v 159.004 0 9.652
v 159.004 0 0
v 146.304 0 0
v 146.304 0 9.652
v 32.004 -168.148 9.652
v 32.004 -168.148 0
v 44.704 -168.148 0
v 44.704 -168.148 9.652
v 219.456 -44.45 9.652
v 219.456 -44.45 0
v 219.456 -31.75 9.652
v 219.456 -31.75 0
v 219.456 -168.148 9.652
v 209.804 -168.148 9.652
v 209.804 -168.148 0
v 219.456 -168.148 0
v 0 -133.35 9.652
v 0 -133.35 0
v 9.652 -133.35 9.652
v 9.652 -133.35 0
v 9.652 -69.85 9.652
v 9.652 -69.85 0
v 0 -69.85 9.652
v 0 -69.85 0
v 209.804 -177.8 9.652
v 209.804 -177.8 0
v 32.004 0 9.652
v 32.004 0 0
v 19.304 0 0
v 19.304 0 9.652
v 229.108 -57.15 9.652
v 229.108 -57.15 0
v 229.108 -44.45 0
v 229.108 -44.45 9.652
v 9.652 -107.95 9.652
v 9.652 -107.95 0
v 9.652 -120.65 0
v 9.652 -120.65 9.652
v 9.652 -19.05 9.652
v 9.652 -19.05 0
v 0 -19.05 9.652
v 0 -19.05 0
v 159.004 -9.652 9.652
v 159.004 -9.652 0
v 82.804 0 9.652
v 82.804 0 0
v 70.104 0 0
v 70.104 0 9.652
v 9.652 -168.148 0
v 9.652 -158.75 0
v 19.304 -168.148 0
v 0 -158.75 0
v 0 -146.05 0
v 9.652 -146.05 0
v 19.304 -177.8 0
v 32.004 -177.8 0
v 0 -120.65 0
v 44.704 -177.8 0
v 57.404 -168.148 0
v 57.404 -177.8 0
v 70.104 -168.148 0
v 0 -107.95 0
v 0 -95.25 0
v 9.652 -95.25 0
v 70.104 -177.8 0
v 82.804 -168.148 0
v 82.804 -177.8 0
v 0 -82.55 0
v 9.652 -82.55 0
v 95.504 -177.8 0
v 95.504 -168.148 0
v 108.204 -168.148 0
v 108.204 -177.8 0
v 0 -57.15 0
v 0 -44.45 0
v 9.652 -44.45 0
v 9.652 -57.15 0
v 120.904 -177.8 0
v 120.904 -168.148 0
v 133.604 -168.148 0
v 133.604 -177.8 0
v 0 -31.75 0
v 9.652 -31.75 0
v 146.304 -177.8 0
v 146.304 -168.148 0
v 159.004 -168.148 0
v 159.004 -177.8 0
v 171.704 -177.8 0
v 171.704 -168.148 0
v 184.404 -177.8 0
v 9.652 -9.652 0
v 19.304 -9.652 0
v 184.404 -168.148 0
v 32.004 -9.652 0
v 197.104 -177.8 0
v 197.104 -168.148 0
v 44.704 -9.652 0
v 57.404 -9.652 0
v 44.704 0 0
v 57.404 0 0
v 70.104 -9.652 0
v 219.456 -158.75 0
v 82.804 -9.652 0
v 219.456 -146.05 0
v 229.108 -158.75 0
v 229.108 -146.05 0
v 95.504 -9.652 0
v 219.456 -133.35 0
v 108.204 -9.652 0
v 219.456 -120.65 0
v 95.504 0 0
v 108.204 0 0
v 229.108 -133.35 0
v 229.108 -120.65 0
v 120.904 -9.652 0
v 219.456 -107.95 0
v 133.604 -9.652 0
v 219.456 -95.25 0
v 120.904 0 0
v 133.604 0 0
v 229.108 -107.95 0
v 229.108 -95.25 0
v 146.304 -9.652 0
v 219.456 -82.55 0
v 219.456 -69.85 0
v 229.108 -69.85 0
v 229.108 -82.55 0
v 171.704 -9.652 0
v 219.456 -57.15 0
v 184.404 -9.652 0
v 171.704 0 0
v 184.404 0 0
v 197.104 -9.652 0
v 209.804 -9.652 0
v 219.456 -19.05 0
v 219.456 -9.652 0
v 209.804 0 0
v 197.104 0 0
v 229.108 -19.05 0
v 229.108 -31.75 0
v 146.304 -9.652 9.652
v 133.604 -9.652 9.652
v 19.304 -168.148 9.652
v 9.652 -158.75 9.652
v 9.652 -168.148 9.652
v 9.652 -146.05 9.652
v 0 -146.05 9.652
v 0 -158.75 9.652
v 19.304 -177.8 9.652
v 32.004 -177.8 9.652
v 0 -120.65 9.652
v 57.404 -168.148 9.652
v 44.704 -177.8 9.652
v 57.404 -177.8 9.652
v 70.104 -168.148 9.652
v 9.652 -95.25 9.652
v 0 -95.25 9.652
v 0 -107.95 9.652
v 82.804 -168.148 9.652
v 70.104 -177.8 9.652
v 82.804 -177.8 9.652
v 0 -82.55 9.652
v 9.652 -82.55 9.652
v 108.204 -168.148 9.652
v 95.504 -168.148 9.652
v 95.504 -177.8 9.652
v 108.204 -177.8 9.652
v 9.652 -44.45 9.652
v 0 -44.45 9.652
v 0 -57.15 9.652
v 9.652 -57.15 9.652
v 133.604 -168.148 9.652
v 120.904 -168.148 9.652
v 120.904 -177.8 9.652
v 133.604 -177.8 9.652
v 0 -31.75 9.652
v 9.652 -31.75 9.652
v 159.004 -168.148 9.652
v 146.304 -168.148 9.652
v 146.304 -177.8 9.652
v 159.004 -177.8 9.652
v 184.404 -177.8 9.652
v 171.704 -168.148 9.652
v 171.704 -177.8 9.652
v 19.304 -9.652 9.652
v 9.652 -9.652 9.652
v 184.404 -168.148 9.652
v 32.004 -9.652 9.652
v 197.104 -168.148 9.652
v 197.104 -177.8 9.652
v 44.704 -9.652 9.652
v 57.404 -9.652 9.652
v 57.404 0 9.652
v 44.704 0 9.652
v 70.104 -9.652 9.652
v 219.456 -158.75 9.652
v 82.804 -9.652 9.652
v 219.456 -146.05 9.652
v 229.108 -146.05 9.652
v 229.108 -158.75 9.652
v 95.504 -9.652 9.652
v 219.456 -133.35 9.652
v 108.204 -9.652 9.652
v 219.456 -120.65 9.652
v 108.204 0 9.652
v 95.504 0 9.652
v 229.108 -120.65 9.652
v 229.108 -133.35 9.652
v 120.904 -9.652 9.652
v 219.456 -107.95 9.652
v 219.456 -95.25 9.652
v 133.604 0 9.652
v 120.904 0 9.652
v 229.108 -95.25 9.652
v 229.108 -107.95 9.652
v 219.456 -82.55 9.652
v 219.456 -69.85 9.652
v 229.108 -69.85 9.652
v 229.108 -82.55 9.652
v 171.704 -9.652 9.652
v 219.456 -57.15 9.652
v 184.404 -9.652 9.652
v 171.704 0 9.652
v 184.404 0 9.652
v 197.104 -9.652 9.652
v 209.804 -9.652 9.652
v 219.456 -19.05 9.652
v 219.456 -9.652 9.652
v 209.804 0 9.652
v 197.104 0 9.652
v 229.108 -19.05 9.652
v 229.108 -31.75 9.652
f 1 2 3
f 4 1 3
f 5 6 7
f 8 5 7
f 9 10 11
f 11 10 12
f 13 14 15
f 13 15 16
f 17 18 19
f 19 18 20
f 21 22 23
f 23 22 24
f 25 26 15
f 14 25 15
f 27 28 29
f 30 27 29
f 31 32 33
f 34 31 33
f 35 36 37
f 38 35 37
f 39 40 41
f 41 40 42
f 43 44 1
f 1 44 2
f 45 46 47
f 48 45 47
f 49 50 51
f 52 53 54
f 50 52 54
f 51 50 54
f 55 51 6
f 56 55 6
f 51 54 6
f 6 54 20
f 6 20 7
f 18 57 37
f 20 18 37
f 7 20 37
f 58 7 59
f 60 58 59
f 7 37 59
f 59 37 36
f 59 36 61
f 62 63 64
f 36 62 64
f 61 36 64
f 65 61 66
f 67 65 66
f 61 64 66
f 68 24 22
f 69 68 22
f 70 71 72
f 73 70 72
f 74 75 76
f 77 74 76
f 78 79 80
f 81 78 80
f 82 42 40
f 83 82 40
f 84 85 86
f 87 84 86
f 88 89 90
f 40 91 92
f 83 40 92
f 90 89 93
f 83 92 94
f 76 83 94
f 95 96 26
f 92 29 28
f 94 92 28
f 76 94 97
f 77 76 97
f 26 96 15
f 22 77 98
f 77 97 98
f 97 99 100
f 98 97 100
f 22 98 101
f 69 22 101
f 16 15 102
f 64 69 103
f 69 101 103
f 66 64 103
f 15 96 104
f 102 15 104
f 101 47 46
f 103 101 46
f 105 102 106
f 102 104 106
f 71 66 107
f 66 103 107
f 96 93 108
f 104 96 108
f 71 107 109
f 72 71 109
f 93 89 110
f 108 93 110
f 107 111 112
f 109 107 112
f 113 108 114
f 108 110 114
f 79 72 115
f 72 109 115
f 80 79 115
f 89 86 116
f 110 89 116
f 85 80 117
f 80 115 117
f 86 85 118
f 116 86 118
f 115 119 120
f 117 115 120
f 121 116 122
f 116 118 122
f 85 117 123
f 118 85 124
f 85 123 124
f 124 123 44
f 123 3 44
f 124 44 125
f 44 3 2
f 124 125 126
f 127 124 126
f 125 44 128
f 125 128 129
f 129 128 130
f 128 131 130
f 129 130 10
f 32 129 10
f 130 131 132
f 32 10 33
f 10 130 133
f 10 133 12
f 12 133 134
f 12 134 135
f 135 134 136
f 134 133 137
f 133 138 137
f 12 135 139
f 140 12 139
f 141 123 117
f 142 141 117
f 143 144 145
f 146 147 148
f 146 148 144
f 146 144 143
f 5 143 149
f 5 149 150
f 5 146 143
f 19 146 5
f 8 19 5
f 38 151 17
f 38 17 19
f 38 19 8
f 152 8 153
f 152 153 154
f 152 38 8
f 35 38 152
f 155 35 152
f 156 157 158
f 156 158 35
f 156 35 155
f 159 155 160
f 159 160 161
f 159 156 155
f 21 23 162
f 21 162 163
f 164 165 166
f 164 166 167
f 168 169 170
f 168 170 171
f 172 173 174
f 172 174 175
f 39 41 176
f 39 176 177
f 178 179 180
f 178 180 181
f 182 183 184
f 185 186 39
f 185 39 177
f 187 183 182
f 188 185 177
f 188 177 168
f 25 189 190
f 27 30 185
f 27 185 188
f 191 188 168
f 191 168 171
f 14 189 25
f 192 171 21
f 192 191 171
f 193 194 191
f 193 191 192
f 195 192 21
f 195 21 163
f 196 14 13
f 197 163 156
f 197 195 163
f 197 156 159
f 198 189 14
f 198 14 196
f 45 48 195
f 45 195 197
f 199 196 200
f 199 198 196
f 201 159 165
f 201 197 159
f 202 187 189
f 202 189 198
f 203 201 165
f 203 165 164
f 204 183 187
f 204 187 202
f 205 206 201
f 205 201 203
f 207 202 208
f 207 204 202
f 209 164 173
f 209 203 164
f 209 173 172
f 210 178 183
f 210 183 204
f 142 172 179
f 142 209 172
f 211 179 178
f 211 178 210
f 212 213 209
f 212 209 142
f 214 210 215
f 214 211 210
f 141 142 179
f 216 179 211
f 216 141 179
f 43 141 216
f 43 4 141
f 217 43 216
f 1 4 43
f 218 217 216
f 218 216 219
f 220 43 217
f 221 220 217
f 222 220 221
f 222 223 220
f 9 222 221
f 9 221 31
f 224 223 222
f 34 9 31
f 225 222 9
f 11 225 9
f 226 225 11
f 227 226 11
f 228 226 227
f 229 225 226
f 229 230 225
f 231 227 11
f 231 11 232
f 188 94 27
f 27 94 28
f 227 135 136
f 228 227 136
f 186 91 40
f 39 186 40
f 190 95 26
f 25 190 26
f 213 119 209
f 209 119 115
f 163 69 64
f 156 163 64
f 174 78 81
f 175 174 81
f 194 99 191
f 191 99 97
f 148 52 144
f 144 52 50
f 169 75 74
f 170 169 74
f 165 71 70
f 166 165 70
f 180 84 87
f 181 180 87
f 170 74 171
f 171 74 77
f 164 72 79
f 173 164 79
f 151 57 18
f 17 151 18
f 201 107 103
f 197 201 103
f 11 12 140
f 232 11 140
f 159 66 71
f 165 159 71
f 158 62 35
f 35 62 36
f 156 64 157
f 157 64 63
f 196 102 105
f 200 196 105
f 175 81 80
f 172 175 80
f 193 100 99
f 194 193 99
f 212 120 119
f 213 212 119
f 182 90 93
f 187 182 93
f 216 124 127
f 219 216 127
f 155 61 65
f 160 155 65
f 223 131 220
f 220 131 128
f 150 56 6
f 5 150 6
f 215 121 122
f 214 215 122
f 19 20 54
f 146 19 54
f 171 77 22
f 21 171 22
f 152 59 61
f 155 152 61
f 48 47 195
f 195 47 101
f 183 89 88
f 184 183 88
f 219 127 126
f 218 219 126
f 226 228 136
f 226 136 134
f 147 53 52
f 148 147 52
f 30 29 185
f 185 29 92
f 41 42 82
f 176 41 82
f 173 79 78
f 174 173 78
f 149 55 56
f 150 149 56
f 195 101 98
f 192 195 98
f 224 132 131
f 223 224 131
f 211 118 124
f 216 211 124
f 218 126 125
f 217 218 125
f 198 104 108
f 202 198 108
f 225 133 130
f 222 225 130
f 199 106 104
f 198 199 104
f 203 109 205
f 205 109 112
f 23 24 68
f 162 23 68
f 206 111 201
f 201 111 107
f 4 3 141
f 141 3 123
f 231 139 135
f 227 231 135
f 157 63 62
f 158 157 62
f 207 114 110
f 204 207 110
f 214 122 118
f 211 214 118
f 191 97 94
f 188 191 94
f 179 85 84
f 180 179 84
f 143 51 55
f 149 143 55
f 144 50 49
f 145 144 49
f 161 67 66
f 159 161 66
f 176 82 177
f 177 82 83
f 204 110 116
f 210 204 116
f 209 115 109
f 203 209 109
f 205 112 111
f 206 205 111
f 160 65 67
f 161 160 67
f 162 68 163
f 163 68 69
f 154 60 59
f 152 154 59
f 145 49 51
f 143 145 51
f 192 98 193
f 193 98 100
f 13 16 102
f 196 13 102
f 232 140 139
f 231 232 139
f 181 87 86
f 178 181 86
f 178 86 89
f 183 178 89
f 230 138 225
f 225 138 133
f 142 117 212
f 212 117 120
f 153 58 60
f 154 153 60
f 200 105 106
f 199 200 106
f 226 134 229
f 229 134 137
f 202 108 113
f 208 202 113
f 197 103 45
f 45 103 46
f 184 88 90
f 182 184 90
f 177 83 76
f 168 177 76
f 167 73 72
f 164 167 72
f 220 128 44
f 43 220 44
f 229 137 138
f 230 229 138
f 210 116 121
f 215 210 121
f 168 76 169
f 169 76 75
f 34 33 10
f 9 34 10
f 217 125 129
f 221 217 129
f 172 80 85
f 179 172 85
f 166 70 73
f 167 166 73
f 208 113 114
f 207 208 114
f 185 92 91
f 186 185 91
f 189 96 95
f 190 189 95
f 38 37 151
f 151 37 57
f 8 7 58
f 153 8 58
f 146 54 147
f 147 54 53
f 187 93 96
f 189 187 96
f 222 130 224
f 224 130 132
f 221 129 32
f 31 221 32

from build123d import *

# Parameters (mm, degrees)
F1_DEPTH = 9.652


with BuildPart() as f1:
    # F0 (on Top) → F1 (new body)
    with BuildSketch(Plane.XY):
        Polygon((32.004, 0), (19.304, 0), (19.304, -9.652), (9.652, -9.652), (9.652, -19.05), (0, -19.05), (0, -31.75), (9.652, -31.75), (9.652, -44.45), (0, -44.45), (0, -57.15), (9.652, -57.15), (9.652, -69.85), (0, -69.85), (0, -82.55), (9.652, -82.55), (9.652, -95.25), (0, -95.25), (0, -107.95), (9.652, -107.95), (9.652, -120.65), (0, -120.65), (0, -133.35), (9.652, -133.35), (9.652, -146.05), (0, -146.05), (0, -158.75), (9.652, -158.75), (9.652, -168.148), (19.304, -168.148), (19.304, -177.8), (32.004, -177.8), (32.004, -168.148), (44.704, -168.148), (44.704, -177.8), (57.404, -177.8), (57.404, -168.148), (70.104, -168.148), (70.104, -177.8), (82.804, -177.8), (82.804, -168.148), (95.504, -168.148), (95.504, -177.8), (108.204, -177.8), (108.204, -168.148), (120.904, -168.148), (120.904, -177.8), (133.604, -177.8), (133.604, -168.148), (146.304, -168.148), (146.304, -177.8), (159.004, -177.8), (159.004, -168.148), (171.704, -168.148), (171.704, -177.8), (184.404, -177.8), (184.404, -168.148), (197.104, -168.148), (197.104, -177.8), (209.804, -177.8), (209.804, -168.148), (219.456, -168.148), (219.456, -158.75), (229.108, -158.75), (229.108, -146.05), (219.456, -146.05), (219.456, -133.35), (229.108, -133.35), (229.108, -120.65), (219.456, -120.65), (219.456, -107.95), (229.108, -107.95), (229.108, -95.25), (219.456, -95.25), (219.456, -82.55), (229.108, -82.55), (229.108, -69.85), (219.456, -69.85), (219.456, -57.15), (229.108, -57.15), (229.108, -44.45), (219.456, -44.45), (219.456, -31.75), (229.108, -31.75), (229.108, -19.05), (219.456, -19.05), (219.456, -9.652), (209.804, -9.652), (209.804, 0), (197.104, 0), (197.104, -9.652), (184.404, -9.652), (184.404, 0), (171.704, 0), (171.704, -9.652), (159.004, -9.652), (159.004, 0), (146.304, 0), (146.304, -9.652), (133.604, -9.652), (133.604, 0), (120.904, 0), (120.904, -9.652), (108.204, -9.652), (108.204, 0), (95.504, 0), (95.504, -9.652), (82.804, -9.652), (82.804, 0), (70.104, 0), (70.104, -9.652), (57.404, -9.652), (57.404, 0), (44.704, 0), (44.704, -9.652), (32.004, -9.652), align=None)
    extrude(amount=F1_DEPTH)


solid = f1.part
